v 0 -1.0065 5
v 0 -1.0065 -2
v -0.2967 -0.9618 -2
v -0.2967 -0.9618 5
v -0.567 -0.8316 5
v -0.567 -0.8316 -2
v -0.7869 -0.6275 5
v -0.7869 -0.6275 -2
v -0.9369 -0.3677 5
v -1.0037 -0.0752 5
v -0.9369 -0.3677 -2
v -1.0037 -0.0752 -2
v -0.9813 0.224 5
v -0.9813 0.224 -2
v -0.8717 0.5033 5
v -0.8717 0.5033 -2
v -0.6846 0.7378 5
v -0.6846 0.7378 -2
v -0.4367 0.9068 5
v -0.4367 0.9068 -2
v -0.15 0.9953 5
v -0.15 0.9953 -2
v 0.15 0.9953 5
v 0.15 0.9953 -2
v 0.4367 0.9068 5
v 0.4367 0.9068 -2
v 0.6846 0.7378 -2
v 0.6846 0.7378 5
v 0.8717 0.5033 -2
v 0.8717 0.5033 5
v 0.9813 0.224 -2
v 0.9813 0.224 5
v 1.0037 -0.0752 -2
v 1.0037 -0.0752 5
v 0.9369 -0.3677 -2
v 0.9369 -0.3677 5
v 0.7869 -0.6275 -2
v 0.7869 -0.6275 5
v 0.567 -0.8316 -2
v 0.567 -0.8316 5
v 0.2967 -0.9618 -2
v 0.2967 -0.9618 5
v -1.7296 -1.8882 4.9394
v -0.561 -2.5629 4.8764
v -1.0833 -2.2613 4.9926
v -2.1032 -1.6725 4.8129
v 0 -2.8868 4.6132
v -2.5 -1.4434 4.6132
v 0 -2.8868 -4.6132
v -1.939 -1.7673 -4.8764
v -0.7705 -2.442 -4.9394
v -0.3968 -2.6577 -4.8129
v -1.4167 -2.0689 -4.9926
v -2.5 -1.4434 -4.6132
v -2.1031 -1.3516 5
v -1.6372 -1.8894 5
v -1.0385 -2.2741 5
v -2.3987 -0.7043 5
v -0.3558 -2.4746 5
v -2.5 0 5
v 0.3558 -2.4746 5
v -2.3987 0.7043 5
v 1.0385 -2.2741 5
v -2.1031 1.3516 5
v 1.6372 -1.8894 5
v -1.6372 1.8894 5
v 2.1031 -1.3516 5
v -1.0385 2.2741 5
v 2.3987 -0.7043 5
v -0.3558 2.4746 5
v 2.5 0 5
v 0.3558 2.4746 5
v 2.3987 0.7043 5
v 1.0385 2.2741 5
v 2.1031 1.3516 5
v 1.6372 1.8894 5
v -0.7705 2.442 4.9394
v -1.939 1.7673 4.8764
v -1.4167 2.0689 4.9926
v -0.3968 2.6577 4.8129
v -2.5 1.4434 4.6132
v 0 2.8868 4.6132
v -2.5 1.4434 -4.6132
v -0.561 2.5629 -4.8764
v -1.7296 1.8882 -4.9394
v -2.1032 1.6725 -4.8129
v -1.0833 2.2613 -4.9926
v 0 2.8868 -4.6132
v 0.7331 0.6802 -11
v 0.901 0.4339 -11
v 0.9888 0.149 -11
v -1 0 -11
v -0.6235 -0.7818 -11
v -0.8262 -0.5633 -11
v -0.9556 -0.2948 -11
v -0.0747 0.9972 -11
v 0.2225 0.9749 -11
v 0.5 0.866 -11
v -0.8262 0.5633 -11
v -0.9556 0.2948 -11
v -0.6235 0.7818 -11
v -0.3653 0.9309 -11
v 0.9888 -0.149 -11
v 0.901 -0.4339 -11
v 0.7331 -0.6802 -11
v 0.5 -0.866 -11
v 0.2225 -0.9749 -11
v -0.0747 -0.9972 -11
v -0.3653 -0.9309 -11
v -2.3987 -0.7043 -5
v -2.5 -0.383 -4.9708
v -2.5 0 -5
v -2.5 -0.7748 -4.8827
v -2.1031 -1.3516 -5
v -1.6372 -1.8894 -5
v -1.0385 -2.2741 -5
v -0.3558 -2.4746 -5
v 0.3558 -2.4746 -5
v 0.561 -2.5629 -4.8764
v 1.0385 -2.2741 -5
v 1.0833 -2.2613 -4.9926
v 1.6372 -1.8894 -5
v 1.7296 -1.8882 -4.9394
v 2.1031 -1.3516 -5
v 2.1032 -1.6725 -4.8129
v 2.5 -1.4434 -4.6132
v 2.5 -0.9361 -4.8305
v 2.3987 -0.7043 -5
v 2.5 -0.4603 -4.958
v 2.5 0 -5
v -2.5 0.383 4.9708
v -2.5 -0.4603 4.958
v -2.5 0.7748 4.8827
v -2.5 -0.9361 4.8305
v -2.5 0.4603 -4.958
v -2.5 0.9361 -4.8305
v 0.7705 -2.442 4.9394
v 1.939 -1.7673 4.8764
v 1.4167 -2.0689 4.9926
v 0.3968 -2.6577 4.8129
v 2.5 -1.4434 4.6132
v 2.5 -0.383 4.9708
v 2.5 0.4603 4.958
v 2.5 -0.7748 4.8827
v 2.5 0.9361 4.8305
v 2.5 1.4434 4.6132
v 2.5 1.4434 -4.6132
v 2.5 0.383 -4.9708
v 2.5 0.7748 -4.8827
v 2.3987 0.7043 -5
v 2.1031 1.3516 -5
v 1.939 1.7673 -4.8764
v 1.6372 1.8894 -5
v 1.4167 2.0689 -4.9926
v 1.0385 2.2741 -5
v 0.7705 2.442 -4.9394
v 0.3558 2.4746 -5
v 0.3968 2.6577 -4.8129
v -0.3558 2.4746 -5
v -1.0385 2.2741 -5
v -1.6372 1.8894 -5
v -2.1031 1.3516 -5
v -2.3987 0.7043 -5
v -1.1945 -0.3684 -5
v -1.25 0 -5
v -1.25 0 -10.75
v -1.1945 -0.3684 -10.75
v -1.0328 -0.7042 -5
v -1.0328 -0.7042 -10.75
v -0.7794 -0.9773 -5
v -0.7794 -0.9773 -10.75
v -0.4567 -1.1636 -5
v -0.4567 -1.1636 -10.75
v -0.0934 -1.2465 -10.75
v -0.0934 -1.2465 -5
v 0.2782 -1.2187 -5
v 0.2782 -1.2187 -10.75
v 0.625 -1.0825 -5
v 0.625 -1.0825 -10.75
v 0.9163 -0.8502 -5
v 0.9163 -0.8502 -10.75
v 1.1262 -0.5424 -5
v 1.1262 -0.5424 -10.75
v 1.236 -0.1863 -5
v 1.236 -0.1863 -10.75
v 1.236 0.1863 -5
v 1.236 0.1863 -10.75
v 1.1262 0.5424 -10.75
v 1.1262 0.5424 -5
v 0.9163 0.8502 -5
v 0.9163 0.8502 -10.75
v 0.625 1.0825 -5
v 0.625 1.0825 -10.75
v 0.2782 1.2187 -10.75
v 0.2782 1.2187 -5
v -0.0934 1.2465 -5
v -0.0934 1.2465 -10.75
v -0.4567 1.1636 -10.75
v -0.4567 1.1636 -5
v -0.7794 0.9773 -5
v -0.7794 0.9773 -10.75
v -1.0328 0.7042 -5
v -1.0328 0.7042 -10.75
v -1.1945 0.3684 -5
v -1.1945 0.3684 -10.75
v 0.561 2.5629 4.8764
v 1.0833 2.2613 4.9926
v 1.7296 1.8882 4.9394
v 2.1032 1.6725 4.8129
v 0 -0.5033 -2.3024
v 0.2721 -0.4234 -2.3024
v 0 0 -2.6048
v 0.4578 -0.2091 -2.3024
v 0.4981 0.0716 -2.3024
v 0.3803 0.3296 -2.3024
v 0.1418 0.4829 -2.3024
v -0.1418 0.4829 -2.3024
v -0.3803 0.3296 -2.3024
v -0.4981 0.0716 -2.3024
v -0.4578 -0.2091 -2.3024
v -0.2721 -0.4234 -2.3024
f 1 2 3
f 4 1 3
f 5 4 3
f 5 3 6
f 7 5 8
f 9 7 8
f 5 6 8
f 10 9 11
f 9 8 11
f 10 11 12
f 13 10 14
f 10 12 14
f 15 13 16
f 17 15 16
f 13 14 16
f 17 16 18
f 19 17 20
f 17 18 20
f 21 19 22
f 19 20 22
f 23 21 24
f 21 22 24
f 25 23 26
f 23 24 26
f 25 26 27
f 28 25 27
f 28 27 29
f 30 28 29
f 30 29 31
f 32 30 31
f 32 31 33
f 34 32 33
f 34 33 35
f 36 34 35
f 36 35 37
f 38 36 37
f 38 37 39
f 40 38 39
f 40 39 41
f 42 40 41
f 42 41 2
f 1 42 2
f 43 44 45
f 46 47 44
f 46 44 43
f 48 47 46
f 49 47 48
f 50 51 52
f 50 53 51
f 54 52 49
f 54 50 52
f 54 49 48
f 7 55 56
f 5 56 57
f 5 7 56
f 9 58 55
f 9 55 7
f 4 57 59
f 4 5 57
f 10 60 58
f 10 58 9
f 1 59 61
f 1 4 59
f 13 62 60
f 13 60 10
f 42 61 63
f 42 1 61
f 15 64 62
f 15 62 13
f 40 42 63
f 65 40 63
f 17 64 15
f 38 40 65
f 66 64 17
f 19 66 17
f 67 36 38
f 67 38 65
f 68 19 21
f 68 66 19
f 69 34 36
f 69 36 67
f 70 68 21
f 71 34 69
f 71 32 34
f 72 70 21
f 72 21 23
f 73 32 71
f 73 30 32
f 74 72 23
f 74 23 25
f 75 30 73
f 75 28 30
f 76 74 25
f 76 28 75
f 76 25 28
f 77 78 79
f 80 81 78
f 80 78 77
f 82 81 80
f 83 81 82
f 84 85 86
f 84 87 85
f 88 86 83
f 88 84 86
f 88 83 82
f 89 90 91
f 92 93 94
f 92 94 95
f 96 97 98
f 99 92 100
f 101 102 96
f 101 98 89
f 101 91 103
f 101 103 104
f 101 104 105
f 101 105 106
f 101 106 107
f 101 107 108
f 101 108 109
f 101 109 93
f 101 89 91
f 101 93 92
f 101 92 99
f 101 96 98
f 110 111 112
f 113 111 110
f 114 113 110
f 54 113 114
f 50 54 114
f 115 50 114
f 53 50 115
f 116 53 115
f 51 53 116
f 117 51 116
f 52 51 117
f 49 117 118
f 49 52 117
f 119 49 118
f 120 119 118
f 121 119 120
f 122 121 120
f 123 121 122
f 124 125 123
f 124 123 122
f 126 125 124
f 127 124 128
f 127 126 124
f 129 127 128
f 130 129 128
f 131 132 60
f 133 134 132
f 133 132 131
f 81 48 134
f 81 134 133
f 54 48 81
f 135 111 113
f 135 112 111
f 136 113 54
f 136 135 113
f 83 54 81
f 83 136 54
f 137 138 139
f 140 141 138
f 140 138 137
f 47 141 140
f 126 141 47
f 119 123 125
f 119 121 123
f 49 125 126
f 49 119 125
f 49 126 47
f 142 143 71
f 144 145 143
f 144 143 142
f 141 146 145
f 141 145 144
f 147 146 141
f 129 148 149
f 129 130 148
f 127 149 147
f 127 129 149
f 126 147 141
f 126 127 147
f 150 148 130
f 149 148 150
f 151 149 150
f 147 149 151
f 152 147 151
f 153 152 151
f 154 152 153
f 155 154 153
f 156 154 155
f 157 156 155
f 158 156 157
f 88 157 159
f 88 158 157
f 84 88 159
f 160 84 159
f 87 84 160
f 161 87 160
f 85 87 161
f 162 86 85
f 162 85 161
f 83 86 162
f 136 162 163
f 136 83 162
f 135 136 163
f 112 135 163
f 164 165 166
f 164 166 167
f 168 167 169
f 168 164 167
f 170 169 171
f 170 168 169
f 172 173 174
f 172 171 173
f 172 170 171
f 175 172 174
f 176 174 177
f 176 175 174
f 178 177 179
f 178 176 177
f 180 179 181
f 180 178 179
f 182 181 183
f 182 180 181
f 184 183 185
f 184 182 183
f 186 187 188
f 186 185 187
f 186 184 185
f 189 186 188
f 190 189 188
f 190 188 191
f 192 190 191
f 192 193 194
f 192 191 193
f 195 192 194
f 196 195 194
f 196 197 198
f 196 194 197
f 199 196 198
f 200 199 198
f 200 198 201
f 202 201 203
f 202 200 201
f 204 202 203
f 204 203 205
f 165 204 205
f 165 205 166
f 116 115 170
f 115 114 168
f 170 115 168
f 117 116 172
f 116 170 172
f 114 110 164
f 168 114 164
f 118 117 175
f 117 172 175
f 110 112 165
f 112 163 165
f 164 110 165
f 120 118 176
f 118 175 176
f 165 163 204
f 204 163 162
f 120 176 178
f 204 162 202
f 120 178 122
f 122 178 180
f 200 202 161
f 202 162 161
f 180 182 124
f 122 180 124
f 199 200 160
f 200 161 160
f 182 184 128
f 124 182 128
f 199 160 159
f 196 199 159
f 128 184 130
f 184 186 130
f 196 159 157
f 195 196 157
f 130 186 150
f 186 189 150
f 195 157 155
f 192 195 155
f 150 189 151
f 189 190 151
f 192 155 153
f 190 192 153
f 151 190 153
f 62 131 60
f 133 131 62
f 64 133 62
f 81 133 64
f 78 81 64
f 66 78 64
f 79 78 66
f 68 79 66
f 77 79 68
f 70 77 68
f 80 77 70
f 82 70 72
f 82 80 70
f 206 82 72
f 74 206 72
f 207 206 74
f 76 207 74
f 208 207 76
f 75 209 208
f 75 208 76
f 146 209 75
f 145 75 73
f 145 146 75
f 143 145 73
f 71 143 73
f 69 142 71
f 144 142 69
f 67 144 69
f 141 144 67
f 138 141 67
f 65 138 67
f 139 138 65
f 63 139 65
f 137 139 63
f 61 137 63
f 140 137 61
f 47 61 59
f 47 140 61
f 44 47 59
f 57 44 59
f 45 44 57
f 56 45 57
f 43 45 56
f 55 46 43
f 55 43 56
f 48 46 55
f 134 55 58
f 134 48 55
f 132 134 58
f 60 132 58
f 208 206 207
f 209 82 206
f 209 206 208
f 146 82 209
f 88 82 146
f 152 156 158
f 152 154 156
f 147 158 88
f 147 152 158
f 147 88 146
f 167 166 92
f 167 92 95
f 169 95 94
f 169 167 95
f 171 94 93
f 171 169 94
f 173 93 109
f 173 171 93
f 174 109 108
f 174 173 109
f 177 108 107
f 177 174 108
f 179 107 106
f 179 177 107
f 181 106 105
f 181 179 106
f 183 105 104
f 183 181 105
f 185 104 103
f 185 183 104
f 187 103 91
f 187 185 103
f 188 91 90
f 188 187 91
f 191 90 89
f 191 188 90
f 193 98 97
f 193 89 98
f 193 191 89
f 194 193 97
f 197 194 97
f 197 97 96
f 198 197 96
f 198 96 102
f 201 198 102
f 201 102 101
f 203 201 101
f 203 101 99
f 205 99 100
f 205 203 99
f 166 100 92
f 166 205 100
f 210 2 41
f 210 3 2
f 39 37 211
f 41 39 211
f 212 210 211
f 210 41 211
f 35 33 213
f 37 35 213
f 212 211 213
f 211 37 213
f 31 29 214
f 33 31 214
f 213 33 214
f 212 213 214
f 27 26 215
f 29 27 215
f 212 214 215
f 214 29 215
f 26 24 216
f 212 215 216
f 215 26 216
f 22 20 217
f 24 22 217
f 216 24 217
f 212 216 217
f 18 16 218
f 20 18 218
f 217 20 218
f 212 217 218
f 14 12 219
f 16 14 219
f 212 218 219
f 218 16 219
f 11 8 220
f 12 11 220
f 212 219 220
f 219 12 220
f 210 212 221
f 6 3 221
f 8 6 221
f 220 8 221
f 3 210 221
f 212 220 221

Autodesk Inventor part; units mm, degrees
ref_plane "YZ Plane" through (0, 0, 0) normal (1, 0, 0) x (0, 1, 0)
ref_plane "XZ Plane" through (0, 0, 0) normal (0, 1, 0) x (-1, 0, 0)
ref_plane "XY Plane" through (0, 0, 0) normal (0, 0, 1) x (1, 0, 0)
sketch "Skizze1" plane through (0, 0, 0) normal (0, 0, 1) x (1, 0, 0)
  line L0 (2.5, -1.4434) -> (0, -2.8868)
  line L1 (0, -2.8868) -> (-2.5, -1.4434)
  line L2 (-2.5, -1.4434) -> (-2.5, 1.4434)
  line L3 (-2.5, 1.4434) -> (0, 2.8868)
  line L4 (0, 2.8868) -> (2.5, 1.4434)
  line L5 (2.5, 1.4434) -> (2.5, -1.4434)
  line L6 (0, 4.4456) -> (0, -4.4456) projected
  point P0 (0, 0)
  point P1 (0, 0)
  dimension "SW" = 5
extrude "Extrusion1" add sketch "Skizze1" along normal mid plane 10
sketch "Skizze2" plane through (0, 0, 5) normal (0, 0, 1) x (1, 0, 0)
  point P0 (0, 0)
  point P1 (0, 0)
hole "Bohrung1" at (0, 0, 5) direction (0, 0, -1) diameter 2.013 depth 7 tip angle 118 thread size "M2.5x0.45" class "6H" standard "ISO Metric profile"
sketch "Skizze3" plane through (0, 0, -5) normal (0, 0, -1) x (-1, 0, 0)
  circle A0 centre (0, 0) radius 1.25
  dimension "GA_" = 2.5
extrude "Extrusion2" add sketch "Skizze3" along normal blind 6
thread "Gewinde1" size "M2.5x0.45" class "6g" standard "ANSI Metric M Profile" full length
chamfer "Fase1" distance 0.25 angle 45 1 edges at (1.25, 0, -11)
sketch "Skizze4" plane through (0, 0, 5) normal (0, 0, 1) x (1, 0, 0)
  line L0 (2.5, -1.4434) -> (2.5, 1.4434) projected
  circle A0 centre (0, 0) radius 2.5
sketch "Skizze5" plane through (0, 0, 0) normal (1, 0, 0) x (0, 1, 0)
  line L0 (-1.0065, 5) -> (1.0065, 5) projected
  line L1 (-2.8868, 5) -> (-1.4434, 5) projected
  line L2 (-1.4434, 5) -> (1.4434, 5) projected
  line L3 (1.4434, 5) -> (2.8868, 5) projected
  line L4 (2.8868, 5) -> (1.4434, 5) projected
  line L5 (1.4434, 5) -> (-1.4434, 5) projected
  line L6 (-1.4434, 5) -> (-2.8868, 5) projected
  line L7 (2.5, 5) -> (-2.5, 5) projected
  line L8 (2.8868, 5) -> (2.5, 5)
  line L9 (2.5, 5) -> (2.8868, 4.6132)
  line L10 (2.8868, 4.6132) -> (2.8868, 5)
  line L11 (0, 7) -> (0, -7) projected
  line L12 (1.25, -5) -> (-1.25, -5) projected
  line L13 (-1.4434, -5) -> (-2.8868, -5) projected
  line L14 (-2.8868, -5) -> (-1.4434, -5) projected
  line L15 (-1.4434, -5) -> (1.4434, -5) projected
  line L16 (1.4434, -5) -> (2.8868, -5) projected
  line L17 (2.8868, -5) -> (1.4434, -5) projected
  line L18 (1.4434, -5) -> (-1.4434, -5) projected
  line L19 (0, 5) -> (0, -5)
  point P0 (0, 0)
  dimension "d20" = 45
revolve "Umdrehung1" cut sketch "Skizze5" angle 360 about axis through (0, 0, 5) along (0, 0, -1)
mirror "Spiegeln1" about plane through (0, 0, 0) normal (0, 0, 1) of "Umdrehung1"
properties part number "M2.5" material "Stahl"
